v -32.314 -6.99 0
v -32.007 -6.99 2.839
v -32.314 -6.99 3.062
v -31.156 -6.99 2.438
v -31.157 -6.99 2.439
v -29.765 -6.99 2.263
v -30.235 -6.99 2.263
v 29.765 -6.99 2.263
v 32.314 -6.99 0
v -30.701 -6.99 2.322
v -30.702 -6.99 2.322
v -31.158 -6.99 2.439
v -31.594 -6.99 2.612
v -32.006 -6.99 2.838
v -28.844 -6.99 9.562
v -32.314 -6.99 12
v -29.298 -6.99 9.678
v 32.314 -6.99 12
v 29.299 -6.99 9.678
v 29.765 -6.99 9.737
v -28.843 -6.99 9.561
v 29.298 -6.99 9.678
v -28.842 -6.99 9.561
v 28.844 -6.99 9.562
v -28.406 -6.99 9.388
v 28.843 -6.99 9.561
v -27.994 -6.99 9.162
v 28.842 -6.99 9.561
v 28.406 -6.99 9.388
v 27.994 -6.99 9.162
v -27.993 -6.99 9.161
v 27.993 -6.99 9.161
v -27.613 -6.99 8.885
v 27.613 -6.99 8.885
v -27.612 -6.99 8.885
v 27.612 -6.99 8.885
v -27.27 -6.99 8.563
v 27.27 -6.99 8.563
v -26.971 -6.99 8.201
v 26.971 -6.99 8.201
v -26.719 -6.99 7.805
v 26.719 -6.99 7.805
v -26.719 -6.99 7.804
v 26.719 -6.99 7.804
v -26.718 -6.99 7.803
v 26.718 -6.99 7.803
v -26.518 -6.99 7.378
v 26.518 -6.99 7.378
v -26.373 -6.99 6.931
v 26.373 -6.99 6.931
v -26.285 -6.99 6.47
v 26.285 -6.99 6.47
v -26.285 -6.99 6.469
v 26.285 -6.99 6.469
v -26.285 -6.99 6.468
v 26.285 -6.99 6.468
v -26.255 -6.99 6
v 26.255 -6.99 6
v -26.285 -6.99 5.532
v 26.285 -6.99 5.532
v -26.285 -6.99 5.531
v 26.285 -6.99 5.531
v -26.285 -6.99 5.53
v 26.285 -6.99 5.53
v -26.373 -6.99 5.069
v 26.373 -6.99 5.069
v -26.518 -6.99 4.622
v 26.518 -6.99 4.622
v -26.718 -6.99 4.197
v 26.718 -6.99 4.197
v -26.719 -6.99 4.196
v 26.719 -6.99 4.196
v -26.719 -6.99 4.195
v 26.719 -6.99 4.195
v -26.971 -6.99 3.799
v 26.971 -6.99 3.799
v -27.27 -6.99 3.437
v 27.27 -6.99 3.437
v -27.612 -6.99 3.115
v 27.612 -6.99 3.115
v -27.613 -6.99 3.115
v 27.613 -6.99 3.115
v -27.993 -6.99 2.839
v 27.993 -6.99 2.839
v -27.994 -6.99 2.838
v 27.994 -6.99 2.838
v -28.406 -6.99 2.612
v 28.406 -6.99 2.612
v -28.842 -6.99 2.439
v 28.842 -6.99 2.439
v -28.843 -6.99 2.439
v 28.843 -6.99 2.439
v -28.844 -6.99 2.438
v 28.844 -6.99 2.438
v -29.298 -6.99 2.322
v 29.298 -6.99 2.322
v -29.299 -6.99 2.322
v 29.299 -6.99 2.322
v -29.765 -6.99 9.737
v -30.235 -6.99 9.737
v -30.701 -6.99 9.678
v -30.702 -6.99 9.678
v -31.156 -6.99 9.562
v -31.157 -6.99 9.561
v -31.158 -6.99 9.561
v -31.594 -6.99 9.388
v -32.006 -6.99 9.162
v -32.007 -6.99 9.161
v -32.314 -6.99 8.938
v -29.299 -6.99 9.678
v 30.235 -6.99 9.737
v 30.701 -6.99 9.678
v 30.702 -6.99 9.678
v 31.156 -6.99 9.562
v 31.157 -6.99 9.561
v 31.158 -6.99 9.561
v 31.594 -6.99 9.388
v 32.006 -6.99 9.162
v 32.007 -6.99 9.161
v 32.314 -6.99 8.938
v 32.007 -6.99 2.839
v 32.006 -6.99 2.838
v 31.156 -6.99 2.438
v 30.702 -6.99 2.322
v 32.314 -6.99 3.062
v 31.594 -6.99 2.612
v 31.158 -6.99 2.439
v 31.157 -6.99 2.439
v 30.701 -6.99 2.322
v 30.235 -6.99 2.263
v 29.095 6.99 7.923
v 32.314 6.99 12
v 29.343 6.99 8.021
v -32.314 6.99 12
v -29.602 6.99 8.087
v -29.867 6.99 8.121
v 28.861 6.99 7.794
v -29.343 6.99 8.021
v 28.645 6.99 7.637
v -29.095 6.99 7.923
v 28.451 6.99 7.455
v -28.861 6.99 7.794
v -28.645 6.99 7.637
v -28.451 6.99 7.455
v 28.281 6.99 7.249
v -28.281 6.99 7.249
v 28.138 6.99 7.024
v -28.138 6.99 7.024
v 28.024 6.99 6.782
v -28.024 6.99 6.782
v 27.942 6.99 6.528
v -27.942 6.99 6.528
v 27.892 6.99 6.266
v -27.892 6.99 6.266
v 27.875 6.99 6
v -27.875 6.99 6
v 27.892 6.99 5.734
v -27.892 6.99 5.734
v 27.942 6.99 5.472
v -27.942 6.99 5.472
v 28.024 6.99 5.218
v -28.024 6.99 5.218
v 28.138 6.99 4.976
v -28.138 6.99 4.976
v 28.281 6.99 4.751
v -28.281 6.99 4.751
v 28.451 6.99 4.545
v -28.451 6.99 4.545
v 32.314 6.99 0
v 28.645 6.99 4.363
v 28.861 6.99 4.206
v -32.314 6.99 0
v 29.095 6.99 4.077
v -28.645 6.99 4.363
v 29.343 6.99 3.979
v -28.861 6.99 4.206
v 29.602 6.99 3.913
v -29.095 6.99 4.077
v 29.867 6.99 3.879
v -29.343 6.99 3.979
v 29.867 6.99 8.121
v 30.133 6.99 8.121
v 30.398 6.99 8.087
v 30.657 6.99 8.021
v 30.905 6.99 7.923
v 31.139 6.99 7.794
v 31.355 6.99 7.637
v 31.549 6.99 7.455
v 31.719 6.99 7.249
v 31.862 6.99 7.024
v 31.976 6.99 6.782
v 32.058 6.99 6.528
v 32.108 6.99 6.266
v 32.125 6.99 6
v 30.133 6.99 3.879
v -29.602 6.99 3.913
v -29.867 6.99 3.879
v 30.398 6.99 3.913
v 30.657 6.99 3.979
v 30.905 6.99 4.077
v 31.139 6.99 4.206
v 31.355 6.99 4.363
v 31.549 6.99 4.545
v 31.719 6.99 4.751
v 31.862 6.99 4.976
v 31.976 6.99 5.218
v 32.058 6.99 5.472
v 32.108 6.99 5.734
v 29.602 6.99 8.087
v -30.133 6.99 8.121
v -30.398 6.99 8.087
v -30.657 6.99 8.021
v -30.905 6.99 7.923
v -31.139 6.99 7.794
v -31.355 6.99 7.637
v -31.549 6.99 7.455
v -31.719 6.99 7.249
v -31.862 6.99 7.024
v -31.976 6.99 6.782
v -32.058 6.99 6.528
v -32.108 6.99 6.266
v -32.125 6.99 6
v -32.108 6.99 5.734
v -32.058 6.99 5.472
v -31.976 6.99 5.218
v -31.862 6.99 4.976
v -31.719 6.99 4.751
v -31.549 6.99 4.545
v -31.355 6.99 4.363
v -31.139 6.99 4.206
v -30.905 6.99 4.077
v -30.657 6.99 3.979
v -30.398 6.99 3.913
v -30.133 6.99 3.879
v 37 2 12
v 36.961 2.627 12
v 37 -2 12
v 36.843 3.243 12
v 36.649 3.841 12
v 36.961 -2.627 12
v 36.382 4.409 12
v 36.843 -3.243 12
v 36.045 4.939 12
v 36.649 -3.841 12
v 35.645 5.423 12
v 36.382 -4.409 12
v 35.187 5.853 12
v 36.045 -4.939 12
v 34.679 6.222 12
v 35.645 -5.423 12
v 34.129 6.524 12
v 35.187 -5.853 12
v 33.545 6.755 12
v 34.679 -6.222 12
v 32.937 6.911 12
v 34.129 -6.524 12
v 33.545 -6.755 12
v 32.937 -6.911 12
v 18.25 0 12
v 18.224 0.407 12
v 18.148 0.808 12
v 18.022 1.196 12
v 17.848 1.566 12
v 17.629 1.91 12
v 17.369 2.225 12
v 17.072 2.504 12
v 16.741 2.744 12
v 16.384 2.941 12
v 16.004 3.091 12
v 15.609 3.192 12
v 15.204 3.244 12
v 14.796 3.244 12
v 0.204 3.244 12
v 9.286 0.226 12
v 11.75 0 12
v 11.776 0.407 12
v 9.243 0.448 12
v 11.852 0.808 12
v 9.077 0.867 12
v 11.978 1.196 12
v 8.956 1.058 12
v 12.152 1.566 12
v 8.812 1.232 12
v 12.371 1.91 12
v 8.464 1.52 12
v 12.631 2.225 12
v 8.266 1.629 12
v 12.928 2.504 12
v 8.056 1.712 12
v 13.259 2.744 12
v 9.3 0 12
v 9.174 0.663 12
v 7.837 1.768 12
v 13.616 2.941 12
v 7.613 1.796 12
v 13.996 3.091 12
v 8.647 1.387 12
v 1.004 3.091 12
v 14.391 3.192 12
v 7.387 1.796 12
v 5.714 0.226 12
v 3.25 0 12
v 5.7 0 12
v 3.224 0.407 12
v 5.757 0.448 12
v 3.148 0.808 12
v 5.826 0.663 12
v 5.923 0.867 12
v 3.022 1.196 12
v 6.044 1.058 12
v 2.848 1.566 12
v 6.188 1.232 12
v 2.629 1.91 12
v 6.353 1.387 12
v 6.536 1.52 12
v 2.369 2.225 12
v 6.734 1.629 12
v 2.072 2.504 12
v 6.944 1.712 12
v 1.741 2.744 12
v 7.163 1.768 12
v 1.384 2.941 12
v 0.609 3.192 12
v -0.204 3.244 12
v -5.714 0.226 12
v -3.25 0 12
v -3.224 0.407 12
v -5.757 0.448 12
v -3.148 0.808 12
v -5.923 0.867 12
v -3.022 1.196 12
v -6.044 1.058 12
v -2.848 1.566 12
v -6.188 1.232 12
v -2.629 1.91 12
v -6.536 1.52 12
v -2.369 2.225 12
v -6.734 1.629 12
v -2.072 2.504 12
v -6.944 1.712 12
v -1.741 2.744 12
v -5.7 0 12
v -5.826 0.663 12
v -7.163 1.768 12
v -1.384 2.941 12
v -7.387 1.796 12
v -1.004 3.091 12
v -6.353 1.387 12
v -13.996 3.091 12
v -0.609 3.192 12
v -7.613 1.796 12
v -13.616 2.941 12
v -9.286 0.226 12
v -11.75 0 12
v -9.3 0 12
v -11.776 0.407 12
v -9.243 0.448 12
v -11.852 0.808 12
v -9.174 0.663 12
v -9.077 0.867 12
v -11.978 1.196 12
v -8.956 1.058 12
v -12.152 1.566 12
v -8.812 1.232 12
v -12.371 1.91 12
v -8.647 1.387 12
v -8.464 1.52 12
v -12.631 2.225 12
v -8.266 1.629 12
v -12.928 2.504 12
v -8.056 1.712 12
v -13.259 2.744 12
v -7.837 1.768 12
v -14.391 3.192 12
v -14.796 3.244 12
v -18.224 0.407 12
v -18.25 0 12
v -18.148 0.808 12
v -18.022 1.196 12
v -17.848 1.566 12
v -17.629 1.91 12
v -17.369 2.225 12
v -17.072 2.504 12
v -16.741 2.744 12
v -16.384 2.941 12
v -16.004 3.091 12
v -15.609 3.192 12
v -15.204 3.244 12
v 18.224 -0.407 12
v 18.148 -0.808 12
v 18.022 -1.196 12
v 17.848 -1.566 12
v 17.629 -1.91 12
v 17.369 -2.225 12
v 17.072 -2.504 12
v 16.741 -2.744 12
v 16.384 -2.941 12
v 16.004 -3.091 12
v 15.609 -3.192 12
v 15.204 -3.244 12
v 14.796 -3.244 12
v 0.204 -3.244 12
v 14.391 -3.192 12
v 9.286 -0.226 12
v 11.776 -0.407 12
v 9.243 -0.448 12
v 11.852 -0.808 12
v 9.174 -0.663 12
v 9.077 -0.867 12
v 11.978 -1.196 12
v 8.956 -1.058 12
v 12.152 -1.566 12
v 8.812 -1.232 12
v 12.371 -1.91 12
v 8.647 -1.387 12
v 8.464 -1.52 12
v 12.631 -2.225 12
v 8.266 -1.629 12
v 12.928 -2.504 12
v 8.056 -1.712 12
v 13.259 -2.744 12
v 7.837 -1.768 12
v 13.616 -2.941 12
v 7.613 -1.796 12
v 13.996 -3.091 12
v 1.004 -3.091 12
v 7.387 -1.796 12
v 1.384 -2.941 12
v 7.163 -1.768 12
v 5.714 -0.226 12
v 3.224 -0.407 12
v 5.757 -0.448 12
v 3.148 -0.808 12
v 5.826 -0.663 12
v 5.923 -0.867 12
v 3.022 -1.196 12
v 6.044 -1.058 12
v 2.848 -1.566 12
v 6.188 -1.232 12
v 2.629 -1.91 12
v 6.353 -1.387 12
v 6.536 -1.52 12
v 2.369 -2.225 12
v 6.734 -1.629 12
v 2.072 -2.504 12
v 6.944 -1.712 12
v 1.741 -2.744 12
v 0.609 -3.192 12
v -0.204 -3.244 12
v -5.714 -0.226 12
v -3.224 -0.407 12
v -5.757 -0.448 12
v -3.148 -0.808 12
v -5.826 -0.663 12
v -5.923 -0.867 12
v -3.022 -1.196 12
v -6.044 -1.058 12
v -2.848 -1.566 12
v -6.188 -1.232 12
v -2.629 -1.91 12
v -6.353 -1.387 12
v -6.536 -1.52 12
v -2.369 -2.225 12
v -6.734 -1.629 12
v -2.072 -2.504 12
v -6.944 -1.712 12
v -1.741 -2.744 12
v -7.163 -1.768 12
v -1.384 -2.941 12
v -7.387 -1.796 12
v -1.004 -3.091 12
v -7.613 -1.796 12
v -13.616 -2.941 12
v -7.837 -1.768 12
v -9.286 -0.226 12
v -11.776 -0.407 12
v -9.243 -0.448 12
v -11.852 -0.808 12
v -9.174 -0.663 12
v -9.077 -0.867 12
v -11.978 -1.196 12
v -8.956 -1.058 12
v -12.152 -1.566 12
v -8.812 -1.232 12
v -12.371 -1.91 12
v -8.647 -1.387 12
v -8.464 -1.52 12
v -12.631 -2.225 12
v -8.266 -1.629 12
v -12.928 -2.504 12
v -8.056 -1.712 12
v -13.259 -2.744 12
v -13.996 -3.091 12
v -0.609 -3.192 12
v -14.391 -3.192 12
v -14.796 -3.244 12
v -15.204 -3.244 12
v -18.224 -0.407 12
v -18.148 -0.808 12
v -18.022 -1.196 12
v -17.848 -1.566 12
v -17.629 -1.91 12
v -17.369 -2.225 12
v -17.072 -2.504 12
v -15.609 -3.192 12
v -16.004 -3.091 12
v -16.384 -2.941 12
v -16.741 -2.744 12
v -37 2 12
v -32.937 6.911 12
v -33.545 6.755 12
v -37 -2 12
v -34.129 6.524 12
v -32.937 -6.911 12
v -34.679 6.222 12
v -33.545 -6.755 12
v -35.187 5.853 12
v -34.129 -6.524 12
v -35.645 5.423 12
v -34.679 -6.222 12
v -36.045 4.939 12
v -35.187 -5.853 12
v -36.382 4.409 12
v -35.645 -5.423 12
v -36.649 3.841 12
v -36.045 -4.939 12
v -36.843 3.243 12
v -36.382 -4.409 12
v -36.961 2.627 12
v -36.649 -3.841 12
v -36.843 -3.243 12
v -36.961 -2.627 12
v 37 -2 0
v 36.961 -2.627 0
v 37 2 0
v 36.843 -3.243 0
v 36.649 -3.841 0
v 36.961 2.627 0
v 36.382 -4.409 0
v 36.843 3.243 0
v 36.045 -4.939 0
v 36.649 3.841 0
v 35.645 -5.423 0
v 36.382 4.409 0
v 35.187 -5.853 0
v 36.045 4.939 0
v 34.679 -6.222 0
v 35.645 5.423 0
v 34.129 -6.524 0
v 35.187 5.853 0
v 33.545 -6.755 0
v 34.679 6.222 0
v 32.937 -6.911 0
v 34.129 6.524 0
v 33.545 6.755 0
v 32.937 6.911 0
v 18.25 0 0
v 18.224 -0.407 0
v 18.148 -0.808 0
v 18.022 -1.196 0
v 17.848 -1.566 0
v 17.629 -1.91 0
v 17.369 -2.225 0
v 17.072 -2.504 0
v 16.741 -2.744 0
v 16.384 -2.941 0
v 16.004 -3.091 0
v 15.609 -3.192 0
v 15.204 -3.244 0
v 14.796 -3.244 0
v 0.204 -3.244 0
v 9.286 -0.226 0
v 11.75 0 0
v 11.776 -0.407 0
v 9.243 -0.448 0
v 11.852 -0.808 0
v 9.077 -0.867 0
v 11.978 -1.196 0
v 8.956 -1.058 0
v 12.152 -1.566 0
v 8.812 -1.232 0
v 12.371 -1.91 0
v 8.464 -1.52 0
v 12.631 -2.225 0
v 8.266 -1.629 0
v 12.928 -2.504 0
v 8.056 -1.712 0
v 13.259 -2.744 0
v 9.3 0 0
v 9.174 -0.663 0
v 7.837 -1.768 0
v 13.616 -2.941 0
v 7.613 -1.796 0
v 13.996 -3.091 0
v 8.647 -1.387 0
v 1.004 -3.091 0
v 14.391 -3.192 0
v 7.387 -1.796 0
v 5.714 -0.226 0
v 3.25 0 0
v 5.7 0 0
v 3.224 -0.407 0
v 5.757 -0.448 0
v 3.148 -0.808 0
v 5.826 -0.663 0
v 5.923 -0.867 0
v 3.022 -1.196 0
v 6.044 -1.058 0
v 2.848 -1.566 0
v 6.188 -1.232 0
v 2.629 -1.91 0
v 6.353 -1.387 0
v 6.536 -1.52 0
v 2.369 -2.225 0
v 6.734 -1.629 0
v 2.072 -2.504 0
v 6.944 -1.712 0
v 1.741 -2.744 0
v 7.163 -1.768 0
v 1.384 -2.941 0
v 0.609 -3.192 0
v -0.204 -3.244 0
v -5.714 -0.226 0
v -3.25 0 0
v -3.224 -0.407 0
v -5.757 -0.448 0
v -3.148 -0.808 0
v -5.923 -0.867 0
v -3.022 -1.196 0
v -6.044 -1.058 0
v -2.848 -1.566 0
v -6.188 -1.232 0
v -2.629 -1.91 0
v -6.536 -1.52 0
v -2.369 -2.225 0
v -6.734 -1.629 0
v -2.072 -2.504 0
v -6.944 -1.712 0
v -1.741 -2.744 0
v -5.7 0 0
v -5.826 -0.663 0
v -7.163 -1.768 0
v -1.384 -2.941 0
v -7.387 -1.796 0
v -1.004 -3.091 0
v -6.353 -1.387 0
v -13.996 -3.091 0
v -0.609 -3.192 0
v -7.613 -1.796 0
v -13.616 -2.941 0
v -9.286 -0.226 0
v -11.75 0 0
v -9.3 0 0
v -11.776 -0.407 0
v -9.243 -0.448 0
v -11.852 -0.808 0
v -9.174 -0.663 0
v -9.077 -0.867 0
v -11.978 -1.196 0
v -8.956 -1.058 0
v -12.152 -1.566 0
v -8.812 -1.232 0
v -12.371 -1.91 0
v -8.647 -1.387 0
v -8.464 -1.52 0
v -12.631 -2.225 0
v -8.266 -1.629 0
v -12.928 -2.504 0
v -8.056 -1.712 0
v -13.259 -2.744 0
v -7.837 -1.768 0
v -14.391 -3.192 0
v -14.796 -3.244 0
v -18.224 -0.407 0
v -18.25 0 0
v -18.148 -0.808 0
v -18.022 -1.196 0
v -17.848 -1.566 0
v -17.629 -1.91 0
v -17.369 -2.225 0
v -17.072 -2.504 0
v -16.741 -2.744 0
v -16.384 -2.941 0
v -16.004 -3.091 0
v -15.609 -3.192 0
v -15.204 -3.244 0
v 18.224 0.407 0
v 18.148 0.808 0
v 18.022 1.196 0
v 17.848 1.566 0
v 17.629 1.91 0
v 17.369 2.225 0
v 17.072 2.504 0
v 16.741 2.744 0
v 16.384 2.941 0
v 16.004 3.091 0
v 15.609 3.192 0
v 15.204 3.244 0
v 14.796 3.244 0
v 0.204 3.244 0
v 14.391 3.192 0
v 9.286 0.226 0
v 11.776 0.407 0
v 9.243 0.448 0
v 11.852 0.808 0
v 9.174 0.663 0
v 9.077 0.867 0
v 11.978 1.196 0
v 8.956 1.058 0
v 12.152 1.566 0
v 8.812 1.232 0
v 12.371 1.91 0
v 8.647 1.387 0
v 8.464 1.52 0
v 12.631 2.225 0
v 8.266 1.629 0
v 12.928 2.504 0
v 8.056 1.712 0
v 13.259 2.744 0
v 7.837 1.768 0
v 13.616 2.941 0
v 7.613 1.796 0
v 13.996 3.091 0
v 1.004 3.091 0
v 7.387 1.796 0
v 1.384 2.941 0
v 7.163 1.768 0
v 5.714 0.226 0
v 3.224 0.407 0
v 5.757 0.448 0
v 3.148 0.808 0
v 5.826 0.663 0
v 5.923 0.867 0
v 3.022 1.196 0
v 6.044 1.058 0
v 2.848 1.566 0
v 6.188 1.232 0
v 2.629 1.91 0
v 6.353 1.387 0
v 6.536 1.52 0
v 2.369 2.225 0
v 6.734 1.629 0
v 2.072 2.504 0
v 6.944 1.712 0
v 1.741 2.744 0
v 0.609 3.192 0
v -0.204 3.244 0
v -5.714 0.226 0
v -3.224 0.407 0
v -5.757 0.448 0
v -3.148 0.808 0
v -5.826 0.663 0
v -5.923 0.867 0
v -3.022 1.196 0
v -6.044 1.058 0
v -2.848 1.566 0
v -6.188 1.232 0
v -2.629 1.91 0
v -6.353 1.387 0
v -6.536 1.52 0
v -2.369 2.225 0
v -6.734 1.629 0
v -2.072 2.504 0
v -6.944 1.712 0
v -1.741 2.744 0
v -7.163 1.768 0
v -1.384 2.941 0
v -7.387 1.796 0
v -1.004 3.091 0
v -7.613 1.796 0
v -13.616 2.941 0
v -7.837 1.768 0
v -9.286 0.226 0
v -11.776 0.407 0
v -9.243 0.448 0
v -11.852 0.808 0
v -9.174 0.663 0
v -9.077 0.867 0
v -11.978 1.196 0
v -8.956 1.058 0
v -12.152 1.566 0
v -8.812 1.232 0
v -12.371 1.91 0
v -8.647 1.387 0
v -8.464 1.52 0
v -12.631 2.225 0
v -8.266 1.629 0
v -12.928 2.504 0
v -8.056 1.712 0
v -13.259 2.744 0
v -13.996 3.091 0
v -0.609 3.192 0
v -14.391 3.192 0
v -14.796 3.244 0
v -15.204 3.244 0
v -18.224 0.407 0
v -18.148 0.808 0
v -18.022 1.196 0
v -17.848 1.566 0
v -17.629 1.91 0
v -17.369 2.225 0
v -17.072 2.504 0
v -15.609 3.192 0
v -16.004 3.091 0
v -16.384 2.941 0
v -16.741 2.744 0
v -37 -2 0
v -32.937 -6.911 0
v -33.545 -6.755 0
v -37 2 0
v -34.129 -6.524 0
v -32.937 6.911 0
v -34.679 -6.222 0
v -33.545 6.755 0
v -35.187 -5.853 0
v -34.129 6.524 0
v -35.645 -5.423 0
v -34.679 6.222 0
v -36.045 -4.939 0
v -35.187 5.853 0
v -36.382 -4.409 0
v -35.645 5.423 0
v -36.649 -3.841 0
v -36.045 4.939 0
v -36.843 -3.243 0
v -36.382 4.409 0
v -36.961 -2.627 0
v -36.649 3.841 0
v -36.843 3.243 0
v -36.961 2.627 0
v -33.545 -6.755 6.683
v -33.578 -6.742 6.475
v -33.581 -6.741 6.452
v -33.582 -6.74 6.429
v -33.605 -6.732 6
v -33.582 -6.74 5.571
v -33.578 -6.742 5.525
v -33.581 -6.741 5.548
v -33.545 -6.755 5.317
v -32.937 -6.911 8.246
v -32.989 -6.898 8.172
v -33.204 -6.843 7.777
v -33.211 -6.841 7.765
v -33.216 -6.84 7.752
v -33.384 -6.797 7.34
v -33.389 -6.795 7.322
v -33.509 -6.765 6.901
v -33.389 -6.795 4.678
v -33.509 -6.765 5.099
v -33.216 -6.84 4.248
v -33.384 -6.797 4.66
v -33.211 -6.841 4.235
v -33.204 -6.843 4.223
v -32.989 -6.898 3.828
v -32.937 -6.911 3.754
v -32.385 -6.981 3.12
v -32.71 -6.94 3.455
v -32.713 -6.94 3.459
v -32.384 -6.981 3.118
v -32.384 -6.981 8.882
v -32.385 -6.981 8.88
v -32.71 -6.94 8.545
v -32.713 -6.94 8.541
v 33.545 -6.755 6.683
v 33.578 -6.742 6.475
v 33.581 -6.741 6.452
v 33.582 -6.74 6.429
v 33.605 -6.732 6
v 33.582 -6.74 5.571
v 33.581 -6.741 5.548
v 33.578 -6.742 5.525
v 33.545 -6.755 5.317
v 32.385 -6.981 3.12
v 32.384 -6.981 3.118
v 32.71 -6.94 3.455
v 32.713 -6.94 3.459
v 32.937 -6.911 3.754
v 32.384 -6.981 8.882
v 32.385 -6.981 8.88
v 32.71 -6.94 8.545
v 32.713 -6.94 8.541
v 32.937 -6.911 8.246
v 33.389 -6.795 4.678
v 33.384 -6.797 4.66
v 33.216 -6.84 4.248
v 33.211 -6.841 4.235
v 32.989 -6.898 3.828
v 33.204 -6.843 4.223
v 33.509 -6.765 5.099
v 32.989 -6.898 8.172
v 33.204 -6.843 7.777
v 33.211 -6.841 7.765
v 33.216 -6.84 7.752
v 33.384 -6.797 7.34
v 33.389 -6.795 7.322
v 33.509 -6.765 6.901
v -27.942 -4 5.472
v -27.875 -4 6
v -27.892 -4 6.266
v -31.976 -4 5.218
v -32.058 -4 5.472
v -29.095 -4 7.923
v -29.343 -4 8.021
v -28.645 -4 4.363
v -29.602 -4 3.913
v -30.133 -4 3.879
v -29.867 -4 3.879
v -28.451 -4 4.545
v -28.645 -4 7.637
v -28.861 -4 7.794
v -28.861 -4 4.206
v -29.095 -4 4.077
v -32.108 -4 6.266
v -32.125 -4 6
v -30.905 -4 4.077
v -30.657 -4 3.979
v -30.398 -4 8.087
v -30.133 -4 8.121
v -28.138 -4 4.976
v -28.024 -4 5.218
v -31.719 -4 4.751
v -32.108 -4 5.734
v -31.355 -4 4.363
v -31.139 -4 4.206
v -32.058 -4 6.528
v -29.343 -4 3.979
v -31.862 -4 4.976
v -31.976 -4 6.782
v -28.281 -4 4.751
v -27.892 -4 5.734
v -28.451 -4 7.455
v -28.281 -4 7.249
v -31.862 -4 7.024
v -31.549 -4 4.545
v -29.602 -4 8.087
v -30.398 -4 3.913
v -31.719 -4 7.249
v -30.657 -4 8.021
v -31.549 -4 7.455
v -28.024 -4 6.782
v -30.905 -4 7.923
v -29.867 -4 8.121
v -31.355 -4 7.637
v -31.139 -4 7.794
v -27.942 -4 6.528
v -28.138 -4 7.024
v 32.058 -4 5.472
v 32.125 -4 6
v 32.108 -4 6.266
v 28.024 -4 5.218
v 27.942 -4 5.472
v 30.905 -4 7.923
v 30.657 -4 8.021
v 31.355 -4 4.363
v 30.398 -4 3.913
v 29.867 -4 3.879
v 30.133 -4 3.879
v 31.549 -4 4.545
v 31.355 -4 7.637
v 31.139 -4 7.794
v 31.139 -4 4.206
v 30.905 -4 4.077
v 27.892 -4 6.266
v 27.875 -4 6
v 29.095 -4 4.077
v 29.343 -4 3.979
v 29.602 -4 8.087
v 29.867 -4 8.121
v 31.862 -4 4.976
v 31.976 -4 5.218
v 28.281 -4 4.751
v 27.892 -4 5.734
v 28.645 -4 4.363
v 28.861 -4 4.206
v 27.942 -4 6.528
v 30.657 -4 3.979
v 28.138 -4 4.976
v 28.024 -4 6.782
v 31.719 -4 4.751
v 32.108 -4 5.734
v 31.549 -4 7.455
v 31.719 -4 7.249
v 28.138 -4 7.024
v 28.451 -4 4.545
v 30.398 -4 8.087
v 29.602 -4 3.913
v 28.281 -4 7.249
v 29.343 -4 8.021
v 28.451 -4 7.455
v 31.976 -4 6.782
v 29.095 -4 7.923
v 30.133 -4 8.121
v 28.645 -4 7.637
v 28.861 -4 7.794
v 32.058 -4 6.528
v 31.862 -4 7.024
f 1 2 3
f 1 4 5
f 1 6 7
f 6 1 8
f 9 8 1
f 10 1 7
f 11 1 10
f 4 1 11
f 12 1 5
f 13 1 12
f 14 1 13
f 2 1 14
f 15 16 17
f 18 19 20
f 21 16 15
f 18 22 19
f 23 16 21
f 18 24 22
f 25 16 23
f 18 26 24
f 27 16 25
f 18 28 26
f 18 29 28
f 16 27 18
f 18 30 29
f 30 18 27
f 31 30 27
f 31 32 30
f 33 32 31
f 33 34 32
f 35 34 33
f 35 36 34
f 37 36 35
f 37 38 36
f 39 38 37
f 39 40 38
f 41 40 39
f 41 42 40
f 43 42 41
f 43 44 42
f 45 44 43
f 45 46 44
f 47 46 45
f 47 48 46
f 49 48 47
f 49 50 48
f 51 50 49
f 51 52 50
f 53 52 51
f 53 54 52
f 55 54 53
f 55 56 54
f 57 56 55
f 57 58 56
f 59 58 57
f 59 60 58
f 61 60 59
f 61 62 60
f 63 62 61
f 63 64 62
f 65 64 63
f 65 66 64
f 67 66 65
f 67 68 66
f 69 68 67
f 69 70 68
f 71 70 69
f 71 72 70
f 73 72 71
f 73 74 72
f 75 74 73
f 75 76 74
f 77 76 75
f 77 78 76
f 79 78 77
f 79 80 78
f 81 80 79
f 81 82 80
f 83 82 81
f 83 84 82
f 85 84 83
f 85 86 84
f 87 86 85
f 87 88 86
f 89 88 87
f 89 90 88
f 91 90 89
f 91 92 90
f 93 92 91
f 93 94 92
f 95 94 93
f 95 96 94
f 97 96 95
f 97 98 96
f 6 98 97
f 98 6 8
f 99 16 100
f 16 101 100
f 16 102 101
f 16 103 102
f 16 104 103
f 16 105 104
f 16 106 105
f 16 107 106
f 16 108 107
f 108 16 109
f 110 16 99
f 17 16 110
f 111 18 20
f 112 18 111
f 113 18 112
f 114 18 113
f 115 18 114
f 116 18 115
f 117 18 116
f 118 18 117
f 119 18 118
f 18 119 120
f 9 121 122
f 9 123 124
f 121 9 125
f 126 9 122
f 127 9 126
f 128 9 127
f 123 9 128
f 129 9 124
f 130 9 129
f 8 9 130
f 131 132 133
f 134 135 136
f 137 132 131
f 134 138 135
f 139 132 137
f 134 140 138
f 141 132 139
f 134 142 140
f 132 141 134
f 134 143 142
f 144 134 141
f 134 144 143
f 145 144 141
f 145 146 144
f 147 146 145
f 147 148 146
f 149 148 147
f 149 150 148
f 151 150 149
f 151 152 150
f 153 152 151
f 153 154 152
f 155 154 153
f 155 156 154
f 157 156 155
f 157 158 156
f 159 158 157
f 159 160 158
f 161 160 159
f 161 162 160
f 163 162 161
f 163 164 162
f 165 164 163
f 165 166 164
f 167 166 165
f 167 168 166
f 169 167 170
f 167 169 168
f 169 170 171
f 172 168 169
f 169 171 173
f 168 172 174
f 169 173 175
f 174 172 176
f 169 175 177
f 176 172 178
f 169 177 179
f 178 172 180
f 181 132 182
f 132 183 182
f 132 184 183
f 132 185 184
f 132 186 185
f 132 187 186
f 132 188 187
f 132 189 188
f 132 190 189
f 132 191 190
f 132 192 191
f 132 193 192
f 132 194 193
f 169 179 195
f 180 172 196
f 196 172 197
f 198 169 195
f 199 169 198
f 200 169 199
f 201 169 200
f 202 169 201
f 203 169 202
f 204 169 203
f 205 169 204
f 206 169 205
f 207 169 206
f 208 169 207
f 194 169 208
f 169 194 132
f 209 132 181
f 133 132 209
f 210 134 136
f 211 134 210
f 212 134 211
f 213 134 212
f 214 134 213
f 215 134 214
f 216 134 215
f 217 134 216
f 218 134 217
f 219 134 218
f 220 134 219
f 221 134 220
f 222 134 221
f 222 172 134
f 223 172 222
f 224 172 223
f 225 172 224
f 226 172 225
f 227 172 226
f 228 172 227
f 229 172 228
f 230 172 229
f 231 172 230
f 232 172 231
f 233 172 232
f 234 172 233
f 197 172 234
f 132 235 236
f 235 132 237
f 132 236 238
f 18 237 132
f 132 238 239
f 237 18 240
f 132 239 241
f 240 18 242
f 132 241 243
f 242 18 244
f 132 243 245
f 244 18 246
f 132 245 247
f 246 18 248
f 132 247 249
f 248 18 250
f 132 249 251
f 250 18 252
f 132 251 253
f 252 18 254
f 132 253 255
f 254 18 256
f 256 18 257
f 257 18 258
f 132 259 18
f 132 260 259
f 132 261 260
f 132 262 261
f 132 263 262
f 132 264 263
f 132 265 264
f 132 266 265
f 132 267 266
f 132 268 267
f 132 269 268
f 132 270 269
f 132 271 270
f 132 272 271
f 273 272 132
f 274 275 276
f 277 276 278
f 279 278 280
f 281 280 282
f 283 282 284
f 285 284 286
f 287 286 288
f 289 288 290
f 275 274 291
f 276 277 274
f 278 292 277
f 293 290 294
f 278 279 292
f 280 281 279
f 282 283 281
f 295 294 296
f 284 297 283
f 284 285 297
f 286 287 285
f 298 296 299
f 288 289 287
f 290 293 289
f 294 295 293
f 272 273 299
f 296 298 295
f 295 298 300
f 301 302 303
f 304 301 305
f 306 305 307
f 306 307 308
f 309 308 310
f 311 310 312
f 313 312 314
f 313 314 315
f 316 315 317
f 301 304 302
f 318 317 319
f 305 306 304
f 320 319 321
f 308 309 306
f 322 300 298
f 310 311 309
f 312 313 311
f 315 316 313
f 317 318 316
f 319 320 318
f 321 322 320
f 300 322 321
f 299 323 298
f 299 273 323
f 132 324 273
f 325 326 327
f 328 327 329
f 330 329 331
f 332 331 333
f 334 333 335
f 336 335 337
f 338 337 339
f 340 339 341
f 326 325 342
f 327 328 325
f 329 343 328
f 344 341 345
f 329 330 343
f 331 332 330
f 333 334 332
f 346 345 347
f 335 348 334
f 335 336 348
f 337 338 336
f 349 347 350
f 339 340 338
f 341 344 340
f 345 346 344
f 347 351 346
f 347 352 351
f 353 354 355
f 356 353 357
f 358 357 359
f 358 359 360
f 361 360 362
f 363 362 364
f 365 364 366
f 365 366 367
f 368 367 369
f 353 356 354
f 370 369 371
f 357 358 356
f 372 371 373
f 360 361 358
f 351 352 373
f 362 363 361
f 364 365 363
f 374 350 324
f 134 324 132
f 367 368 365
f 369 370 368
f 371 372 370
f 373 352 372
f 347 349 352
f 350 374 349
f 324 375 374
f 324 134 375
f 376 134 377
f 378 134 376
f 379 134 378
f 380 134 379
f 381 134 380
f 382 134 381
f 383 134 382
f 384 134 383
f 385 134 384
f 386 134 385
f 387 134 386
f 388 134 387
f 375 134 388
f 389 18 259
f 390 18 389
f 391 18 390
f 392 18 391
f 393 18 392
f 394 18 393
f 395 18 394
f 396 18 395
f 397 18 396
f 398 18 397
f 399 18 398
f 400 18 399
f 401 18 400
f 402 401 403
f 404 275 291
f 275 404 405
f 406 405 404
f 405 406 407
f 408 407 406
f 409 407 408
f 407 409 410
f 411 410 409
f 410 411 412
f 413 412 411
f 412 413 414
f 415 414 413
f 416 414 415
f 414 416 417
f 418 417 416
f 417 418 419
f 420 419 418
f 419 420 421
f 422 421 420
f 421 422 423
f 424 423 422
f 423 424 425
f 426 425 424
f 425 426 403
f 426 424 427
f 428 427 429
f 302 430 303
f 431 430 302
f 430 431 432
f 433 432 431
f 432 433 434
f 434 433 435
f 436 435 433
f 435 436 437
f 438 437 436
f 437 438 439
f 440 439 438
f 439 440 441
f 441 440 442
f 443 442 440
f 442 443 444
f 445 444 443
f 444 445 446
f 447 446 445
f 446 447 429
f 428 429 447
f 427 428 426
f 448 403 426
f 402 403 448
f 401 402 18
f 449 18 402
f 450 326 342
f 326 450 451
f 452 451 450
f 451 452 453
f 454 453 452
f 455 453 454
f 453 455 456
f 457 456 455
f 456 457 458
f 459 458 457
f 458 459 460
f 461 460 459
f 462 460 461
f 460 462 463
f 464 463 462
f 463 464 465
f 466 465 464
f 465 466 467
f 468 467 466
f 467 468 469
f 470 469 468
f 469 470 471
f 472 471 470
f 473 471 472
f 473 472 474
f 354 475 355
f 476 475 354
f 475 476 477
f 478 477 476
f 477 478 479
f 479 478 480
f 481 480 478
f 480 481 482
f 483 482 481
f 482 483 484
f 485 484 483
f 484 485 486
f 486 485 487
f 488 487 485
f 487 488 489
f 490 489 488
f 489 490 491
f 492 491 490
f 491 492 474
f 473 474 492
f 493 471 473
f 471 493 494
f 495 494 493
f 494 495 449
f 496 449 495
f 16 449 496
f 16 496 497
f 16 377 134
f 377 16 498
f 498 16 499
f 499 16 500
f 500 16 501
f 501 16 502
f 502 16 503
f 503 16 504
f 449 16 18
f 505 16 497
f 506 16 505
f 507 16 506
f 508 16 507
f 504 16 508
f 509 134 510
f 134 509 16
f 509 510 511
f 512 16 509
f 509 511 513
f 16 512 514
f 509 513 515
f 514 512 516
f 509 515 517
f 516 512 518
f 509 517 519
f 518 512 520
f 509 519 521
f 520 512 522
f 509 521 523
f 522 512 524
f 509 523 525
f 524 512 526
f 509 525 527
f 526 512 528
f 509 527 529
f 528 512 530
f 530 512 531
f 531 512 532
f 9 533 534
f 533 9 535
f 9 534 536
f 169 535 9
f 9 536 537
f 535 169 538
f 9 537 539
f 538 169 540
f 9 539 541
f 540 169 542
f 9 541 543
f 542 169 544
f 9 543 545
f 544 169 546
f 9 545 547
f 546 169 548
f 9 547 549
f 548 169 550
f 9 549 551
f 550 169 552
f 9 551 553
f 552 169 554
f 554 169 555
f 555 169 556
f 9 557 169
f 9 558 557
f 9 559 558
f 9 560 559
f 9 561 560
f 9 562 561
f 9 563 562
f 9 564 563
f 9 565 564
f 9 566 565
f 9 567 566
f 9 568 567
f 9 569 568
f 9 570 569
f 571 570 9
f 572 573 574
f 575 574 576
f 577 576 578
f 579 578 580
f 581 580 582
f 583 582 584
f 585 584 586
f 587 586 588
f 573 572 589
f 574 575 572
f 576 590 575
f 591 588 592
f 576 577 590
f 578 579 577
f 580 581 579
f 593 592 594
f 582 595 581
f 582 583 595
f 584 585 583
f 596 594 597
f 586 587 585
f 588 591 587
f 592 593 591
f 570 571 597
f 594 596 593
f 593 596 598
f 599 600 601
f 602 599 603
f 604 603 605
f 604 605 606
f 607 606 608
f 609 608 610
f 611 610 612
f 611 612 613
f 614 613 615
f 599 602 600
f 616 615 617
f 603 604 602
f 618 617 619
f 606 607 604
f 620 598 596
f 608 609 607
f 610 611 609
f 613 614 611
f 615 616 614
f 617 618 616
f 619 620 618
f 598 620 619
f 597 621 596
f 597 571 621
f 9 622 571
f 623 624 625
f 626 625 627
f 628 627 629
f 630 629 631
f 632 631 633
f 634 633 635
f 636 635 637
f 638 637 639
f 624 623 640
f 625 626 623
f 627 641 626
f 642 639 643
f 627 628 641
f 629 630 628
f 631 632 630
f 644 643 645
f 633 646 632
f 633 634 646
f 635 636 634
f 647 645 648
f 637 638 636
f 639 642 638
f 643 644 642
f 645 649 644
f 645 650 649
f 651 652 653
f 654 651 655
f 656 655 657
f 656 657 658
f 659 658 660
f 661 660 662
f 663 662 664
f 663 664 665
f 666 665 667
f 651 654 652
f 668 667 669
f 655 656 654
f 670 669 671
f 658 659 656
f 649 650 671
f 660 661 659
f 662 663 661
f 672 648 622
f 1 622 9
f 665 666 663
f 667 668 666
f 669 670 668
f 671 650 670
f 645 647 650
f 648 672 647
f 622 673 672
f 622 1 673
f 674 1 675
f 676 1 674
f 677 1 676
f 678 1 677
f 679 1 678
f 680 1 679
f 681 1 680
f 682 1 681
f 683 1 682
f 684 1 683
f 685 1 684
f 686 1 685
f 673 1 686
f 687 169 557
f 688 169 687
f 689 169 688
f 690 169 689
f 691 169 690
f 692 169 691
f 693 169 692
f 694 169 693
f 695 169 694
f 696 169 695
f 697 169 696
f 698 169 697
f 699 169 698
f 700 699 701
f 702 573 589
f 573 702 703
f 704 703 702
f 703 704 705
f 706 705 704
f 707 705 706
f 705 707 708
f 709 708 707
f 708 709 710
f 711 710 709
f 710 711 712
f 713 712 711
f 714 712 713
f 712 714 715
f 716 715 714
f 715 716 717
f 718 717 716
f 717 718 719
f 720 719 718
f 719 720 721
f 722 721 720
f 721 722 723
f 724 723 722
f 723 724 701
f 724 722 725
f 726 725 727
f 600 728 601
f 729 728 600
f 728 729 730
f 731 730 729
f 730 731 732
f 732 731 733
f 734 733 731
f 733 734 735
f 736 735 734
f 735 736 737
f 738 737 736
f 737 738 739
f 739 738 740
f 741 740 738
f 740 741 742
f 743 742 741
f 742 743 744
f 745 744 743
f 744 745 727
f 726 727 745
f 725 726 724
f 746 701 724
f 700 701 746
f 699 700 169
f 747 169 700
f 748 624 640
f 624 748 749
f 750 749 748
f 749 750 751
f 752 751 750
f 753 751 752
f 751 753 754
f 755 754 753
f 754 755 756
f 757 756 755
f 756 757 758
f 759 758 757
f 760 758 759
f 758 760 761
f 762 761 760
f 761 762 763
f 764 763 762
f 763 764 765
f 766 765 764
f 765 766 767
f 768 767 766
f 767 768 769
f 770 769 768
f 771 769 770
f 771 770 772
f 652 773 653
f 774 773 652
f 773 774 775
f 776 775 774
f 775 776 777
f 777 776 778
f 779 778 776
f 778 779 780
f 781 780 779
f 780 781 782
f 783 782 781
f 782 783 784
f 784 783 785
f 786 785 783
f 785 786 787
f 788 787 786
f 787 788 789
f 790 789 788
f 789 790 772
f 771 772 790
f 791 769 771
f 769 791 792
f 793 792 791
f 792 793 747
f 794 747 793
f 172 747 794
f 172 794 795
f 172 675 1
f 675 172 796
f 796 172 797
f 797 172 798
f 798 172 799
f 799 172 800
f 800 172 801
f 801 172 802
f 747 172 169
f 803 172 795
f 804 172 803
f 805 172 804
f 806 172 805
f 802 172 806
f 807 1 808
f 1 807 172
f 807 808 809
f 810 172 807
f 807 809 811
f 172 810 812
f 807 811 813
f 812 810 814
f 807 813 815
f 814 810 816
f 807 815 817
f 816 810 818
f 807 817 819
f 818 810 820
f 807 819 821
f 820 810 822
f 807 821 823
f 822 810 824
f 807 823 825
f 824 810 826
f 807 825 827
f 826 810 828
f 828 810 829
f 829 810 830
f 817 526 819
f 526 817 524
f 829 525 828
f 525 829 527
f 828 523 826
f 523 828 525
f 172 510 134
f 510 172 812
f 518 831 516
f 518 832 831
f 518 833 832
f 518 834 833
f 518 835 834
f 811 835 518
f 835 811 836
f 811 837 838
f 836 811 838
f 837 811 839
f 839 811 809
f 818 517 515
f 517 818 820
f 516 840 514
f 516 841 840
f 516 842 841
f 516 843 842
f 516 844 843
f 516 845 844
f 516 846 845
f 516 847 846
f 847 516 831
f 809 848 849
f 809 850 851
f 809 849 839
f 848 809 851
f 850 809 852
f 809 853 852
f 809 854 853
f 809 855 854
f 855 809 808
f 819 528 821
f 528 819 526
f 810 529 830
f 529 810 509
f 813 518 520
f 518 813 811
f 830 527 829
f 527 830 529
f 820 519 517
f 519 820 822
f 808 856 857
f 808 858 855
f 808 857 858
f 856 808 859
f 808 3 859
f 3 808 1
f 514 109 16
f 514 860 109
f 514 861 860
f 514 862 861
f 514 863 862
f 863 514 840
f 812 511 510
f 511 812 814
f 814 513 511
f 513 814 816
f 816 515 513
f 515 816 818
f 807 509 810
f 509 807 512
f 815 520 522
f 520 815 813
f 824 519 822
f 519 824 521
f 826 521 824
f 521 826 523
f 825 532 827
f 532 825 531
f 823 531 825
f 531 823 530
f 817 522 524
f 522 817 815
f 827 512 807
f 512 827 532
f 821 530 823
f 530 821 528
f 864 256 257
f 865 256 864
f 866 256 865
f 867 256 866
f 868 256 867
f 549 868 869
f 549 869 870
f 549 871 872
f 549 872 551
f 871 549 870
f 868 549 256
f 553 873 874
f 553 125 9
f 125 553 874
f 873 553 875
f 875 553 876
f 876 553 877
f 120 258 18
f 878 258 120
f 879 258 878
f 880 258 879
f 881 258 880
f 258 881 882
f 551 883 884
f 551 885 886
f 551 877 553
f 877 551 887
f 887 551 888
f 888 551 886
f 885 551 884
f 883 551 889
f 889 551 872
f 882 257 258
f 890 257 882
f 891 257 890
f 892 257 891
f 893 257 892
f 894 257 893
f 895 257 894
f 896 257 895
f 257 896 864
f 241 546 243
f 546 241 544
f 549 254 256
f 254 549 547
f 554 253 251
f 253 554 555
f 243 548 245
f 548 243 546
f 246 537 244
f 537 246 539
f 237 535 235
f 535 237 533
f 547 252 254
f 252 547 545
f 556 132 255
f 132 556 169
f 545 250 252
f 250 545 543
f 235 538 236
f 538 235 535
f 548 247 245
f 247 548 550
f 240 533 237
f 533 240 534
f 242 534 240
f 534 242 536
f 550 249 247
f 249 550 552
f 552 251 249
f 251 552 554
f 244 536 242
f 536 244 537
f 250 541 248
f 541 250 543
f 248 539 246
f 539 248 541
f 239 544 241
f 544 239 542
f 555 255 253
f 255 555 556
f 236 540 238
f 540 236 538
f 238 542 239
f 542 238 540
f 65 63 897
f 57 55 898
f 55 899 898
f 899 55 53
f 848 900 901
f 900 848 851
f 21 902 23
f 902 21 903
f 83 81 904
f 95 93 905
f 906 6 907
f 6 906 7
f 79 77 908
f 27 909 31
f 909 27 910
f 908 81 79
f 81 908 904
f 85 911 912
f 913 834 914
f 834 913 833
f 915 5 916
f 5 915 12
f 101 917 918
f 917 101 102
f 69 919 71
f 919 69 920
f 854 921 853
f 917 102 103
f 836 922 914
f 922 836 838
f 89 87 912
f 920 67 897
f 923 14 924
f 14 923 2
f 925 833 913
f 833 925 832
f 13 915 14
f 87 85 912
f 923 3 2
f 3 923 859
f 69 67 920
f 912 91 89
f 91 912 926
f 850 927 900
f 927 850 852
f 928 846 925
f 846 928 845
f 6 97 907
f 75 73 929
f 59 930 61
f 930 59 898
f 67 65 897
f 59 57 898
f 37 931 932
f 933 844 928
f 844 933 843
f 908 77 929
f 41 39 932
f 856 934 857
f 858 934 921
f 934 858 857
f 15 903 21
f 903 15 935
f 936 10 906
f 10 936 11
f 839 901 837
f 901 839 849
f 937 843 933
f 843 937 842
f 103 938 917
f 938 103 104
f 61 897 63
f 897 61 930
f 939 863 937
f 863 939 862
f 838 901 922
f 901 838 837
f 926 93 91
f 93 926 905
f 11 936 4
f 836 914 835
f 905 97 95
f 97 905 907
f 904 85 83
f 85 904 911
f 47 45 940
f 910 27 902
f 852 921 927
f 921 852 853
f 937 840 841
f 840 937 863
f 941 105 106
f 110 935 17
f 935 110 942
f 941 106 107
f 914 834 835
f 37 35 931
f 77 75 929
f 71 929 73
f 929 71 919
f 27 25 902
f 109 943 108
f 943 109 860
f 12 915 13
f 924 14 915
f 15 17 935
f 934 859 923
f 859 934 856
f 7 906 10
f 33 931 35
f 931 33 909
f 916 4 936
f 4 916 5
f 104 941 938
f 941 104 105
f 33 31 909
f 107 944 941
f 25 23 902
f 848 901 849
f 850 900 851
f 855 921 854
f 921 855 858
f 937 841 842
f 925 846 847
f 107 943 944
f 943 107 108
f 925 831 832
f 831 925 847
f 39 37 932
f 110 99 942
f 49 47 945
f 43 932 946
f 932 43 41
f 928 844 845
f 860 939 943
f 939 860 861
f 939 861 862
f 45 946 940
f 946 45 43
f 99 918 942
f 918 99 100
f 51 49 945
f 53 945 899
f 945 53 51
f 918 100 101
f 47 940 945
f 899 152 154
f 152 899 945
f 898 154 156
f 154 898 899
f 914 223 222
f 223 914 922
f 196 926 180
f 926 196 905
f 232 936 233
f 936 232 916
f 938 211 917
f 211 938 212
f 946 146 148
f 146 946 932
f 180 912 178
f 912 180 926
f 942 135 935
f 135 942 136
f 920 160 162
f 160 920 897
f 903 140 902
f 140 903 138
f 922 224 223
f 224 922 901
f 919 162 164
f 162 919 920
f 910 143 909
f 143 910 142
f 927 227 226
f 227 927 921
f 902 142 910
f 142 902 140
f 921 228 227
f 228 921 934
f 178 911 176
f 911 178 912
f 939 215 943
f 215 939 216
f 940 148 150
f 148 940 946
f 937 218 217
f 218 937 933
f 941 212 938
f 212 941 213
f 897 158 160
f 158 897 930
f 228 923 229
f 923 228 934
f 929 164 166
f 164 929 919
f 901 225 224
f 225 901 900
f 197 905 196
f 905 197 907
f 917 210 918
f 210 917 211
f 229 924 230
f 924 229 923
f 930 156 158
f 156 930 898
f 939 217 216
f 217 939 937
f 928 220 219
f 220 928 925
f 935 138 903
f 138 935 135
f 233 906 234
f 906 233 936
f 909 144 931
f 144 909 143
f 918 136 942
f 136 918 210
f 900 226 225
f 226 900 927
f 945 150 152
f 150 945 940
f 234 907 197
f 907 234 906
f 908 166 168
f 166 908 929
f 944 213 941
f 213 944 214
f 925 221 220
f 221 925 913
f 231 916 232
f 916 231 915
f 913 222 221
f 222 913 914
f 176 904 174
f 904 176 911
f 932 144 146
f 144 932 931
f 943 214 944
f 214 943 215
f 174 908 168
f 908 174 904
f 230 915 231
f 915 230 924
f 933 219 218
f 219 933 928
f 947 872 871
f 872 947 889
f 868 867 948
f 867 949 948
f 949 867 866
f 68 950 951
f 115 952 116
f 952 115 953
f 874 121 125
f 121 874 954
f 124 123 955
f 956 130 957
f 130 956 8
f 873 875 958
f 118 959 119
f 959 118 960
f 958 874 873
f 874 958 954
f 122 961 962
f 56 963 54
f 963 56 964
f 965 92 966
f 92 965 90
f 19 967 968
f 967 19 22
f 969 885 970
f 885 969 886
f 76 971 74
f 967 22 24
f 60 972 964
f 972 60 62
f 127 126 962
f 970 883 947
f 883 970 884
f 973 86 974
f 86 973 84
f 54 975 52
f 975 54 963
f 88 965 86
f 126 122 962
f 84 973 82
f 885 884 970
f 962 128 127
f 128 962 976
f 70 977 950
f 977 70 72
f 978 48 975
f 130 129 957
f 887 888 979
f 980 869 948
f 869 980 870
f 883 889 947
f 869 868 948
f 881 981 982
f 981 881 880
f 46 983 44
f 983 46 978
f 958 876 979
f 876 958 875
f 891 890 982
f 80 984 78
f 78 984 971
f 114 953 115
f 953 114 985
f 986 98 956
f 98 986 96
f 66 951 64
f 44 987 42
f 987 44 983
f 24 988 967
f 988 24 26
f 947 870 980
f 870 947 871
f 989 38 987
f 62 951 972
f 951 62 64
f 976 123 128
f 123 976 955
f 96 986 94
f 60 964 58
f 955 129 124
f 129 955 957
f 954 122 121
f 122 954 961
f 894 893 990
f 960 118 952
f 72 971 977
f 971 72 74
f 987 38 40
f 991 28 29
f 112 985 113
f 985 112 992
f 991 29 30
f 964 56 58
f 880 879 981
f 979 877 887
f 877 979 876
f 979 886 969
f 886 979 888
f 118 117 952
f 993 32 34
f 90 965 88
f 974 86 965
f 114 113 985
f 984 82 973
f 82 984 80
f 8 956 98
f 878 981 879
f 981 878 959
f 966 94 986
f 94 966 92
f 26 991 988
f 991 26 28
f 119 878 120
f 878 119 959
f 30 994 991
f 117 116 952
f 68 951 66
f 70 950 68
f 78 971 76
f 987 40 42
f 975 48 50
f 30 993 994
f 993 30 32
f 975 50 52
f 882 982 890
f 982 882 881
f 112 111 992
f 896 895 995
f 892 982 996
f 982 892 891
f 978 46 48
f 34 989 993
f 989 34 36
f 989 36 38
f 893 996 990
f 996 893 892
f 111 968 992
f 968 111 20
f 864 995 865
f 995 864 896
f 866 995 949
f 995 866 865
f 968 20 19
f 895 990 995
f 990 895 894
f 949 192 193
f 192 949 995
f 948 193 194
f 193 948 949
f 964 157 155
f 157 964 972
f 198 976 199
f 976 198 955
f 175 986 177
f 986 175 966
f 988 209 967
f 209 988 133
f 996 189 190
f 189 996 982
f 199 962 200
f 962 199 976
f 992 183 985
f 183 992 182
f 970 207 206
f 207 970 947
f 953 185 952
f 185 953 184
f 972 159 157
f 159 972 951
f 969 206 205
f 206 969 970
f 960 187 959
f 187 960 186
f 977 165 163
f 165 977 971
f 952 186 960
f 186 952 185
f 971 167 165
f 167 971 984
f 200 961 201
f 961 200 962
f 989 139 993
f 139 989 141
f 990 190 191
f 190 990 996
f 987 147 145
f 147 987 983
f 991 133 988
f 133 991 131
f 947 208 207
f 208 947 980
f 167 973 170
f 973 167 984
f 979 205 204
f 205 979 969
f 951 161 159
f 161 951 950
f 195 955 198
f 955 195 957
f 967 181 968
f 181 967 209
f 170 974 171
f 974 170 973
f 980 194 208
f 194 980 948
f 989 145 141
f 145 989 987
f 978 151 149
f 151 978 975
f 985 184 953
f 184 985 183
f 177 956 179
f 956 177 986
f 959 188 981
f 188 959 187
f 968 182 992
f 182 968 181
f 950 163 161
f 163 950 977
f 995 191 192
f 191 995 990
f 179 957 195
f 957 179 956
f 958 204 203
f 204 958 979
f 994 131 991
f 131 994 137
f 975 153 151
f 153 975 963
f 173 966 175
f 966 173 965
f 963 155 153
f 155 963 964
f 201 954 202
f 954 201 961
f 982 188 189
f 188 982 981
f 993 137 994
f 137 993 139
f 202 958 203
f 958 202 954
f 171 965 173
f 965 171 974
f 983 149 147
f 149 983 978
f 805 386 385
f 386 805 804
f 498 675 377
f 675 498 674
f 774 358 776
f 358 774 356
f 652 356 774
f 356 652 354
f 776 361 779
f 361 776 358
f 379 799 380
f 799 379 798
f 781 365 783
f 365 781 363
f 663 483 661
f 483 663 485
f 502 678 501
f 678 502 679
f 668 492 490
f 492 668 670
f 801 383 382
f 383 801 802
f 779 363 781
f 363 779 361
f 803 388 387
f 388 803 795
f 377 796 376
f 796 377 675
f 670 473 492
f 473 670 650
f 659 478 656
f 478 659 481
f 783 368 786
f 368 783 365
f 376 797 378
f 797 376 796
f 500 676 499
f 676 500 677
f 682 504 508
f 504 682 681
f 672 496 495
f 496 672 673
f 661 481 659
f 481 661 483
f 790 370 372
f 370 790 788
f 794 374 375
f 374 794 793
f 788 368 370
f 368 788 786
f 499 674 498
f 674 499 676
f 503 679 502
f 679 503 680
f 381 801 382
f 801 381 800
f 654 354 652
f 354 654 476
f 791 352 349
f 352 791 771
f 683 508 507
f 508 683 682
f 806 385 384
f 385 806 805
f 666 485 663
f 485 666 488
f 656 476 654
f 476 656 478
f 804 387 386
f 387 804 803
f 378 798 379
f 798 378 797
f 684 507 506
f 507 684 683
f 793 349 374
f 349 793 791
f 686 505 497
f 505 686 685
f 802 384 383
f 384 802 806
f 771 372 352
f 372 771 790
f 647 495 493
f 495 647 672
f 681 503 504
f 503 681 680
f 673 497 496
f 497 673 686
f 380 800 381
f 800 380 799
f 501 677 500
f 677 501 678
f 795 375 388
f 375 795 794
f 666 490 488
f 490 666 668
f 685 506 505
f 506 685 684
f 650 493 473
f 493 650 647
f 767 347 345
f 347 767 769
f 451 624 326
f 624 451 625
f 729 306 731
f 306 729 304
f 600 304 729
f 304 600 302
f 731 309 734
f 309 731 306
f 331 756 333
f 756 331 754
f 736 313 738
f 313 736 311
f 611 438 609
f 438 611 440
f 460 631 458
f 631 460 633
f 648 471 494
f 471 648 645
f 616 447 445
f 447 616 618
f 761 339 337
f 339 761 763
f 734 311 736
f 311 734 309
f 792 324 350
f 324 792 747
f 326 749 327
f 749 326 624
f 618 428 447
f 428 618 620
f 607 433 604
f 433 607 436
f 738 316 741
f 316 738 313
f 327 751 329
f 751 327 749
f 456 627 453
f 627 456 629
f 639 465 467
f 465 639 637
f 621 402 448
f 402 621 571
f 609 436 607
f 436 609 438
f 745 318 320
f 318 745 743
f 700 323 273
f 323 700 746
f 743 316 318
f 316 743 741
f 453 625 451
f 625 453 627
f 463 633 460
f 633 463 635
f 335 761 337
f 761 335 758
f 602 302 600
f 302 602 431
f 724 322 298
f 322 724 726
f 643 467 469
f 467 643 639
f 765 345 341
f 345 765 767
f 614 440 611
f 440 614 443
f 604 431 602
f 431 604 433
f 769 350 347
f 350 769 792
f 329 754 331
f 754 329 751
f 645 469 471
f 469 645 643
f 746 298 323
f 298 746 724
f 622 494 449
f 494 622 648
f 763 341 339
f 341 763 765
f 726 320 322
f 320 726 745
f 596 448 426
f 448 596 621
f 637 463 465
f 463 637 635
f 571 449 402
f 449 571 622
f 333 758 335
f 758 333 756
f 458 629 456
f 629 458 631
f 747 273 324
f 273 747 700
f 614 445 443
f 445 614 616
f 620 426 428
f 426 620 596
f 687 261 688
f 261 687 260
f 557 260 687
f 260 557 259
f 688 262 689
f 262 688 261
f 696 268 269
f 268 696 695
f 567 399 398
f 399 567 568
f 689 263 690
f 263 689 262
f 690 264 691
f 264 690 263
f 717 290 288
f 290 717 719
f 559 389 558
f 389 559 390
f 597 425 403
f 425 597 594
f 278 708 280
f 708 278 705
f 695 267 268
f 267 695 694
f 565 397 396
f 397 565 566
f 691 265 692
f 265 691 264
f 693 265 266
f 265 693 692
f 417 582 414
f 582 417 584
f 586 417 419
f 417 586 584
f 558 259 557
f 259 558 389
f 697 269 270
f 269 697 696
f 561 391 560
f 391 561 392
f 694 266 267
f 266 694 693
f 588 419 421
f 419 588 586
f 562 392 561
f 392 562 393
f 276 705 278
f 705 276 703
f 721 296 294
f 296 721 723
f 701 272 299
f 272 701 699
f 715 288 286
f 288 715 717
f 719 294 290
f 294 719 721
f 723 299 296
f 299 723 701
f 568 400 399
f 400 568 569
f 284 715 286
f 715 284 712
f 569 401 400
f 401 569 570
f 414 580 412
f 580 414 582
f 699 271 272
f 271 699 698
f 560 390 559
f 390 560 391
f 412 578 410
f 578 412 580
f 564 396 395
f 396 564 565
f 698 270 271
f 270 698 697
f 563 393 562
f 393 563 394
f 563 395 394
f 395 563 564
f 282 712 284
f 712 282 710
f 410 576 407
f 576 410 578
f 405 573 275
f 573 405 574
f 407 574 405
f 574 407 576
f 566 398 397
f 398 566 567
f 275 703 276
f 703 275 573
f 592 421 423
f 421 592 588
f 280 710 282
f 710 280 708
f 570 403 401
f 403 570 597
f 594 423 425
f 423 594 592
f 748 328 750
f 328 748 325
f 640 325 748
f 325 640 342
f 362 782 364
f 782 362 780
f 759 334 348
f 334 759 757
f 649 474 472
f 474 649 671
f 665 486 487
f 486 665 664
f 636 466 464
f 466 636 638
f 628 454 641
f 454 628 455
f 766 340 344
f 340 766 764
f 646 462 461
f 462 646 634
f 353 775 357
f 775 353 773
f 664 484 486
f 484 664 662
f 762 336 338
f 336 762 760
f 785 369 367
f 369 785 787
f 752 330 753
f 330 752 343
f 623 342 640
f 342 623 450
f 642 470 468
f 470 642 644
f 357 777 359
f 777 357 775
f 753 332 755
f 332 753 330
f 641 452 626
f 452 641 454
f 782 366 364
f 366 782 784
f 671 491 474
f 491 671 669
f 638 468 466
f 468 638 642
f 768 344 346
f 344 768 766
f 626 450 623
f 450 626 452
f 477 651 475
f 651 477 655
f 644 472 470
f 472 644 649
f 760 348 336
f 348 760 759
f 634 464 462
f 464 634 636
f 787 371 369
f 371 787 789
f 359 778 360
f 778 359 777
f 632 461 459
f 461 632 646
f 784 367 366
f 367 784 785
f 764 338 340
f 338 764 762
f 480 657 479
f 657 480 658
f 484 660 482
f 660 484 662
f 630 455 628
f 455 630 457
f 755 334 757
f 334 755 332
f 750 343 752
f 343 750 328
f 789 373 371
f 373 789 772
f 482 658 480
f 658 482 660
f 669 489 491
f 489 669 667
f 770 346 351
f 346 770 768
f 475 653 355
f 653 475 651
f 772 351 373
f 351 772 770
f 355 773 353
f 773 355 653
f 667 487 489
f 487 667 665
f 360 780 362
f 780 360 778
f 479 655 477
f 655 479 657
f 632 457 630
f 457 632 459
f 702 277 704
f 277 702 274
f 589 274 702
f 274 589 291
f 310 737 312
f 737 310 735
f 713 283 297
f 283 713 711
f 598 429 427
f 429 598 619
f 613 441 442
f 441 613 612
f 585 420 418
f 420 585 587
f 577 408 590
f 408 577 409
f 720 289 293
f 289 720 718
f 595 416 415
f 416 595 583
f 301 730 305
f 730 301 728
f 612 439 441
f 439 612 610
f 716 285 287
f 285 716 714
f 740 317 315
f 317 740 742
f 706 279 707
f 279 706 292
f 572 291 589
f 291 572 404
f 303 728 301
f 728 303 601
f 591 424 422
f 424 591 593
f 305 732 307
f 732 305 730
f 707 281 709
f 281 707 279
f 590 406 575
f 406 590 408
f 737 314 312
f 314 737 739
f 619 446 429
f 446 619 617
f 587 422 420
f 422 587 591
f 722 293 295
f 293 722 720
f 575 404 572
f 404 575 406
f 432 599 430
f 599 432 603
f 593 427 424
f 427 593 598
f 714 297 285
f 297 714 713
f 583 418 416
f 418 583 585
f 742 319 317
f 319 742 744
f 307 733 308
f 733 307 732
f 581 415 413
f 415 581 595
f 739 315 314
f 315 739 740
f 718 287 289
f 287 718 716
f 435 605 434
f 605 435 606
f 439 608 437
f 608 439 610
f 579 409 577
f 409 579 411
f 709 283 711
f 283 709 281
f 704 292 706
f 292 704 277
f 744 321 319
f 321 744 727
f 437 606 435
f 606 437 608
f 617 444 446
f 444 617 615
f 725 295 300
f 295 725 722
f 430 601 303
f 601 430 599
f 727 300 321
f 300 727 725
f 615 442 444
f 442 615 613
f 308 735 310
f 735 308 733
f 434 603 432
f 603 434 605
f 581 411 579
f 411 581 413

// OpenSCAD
$fn = 50;


difference() {
	union() {
		hull() {
			translate(v = [-17.0000000000, 2.0000000000, 0]) {
				cylinder(h = 12, r = 5);
			}
			translate(v = [17.0000000000, 2.0000000000, 0]) {
				cylinder(h = 12, r = 5);
			}
			translate(v = [-17.0000000000, -2.0000000000, 0]) {
				cylinder(h = 12, r = 5);
			}
			translate(v = [17.0000000000, -2.0000000000, 0]) {
				cylinder(h = 12, r = 5);
			}
		}
		translate(v = [-22.5000000000, 0.0000000000, 0]) {
			hull() {
				translate(v = [-9.5000000000, 2.0000000000, 0]) {
					cylinder(h = 12, r = 5);
				}
				translate(v = [9.5000000000, 2.0000000000, 0]) {
					cylinder(h = 12, r = 5);
				}
				translate(v = [-9.5000000000, -2.0000000000, 0]) {
					cylinder(h = 12, r = 5);
				}
				translate(v = [9.5000000000, -2.0000000000, 0]) {
					cylinder(h = 12, r = 5);
				}
			}
		}
		translate(v = [-22.5000000000, 0.0000000000, 0]) {
			hull() {
				translate(v = [-9.5000000000, 2.0000000000, 0]) {
					cylinder(h = 12, r = 5);
				}
				translate(v = [9.5000000000, 2.0000000000, 0]) {
					cylinder(h = 12, r = 5);
				}
				translate(v = [-9.5000000000, -2.0000000000, 0]) {
					cylinder(h = 12, r = 5);
				}
				translate(v = [9.5000000000, -2.0000000000, 0]) {
					cylinder(h = 12, r = 5);
				}
			}
		}
		translate(v = [22.5000000000, 0.0000000000, 0]) {
			hull() {
				translate(v = [-9.5000000000, 2.0000000000, 0]) {
					cylinder(h = 12, r = 5);
				}
				translate(v = [9.5000000000, 2.0000000000, 0]) {
					cylinder(h = 12, r = 5);
				}
				translate(v = [-9.5000000000, -2.0000000000, 0]) {
					cylinder(h = 12, r = 5);
				}
				translate(v = [9.5000000000, -2.0000000000, 0]) {
					cylinder(h = 12, r = 5);
				}
			}
		}
		translate(v = [22.5000000000, 0.0000000000, 0]) {
			hull() {
				translate(v = [-9.5000000000, 2.0000000000, 0]) {
					cylinder(h = 12, r = 5);
				}
				translate(v = [9.5000000000, 2.0000000000, 0]) {
					cylinder(h = 12, r = 5);
				}
				translate(v = [-9.5000000000, -2.0000000000, 0]) {
					cylinder(h = 12, r = 5);
				}
				translate(v = [9.5000000000, -2.0000000000, 0]) {
					cylinder(h = 12, r = 5);
				}
			}
		}
	}
	union() {
		translate(v = [-30.0000000000, -7.0000000000, 6.0000000000]) {
			rotate(a = [90, 0, 0]) {
				difference() {
					union() {
						#translate(v = [0, 0, -14.0000000000]) {
							cylinder(h = 14, r = 2.0000000000);
						}
						#translate(v = [0, 0, -3]) {
							cylinder(h = 3, r1 = 2.1250000000, r2 = 3.7500000000);
						}
						#translate(v = [0, 0, -14.0000000000]) {
							cylinder(h = 14, r = 2.1250000000);
						}
						#translate(v = [0, 0, -14.0000000000]) {
							cylinder(h = 14, r = 2.0000000000);
						}
					}
					union();
				}
			}
		}
		translate(v = [30.0000000000, -7.0000000000, 6.0000000000]) {
			rotate(a = [90, 0, 0]) {
				difference() {
					union() {
						#translate(v = [0, 0, -14.0000000000]) {
							cylinder(h = 14, r = 2.0000000000);
						}
						#translate(v = [0, 0, -3]) {
							cylinder(h = 3, r1 = 2.1250000000, r2 = 3.7500000000);
						}
						#translate(v = [0, 0, -14.0000000000]) {
							cylinder(h = 14, r = 2.1250000000);
						}
						#translate(v = [0, 0, -14.0000000000]) {
							cylinder(h = 14, r = 2.0000000000);
						}
					}
					union();
				}
			}
		}
		translate(v = [-15.0000000000, 0.0000000000, 0]) {
			translate(v = [0, 0, -100]) {
				cylinder(h = 200, r = 3.2500000000);
			}
		}
		translate(v = [0, 0, -100]) {
			cylinder(h = 200, r = 3.2500000000);
		}
		translate(v = [15.0000000000, 0.0000000000, 0]) {
			translate(v = [0, 0, -100]) {
				cylinder(h = 200, r = 3.2500000000);
			}
		}
		translate(v = [-15.0000000000, 0.0000000000, 0]) {
			translate(v = [0, 0, -100]) {
				cylinder(h = 200, r = 1.8000000000);
			}
		}
		translate(v = [-7.5000000000, 0.0000000000, 0]) {
			translate(v = [0, 0, -100]) {
				cylinder(h = 200, r = 1.8000000000);
			}
		}
		translate(v = [0, 0, -100]) {
			cylinder(h = 200, r = 1.8000000000);
		}
		translate(v = [7.5000000000, 0.0000000000, 0]) {
			translate(v = [0, 0, -100]) {
				cylinder(h = 200, r = 1.8000000000);
			}
		}
		translate(v = [15.0000000000, 0.0000000000, 0]) {
			translate(v = [0, 0, -100]) {
				cylinder(h = 200, r = 1.8000000000);
			}
		}
	}
}
